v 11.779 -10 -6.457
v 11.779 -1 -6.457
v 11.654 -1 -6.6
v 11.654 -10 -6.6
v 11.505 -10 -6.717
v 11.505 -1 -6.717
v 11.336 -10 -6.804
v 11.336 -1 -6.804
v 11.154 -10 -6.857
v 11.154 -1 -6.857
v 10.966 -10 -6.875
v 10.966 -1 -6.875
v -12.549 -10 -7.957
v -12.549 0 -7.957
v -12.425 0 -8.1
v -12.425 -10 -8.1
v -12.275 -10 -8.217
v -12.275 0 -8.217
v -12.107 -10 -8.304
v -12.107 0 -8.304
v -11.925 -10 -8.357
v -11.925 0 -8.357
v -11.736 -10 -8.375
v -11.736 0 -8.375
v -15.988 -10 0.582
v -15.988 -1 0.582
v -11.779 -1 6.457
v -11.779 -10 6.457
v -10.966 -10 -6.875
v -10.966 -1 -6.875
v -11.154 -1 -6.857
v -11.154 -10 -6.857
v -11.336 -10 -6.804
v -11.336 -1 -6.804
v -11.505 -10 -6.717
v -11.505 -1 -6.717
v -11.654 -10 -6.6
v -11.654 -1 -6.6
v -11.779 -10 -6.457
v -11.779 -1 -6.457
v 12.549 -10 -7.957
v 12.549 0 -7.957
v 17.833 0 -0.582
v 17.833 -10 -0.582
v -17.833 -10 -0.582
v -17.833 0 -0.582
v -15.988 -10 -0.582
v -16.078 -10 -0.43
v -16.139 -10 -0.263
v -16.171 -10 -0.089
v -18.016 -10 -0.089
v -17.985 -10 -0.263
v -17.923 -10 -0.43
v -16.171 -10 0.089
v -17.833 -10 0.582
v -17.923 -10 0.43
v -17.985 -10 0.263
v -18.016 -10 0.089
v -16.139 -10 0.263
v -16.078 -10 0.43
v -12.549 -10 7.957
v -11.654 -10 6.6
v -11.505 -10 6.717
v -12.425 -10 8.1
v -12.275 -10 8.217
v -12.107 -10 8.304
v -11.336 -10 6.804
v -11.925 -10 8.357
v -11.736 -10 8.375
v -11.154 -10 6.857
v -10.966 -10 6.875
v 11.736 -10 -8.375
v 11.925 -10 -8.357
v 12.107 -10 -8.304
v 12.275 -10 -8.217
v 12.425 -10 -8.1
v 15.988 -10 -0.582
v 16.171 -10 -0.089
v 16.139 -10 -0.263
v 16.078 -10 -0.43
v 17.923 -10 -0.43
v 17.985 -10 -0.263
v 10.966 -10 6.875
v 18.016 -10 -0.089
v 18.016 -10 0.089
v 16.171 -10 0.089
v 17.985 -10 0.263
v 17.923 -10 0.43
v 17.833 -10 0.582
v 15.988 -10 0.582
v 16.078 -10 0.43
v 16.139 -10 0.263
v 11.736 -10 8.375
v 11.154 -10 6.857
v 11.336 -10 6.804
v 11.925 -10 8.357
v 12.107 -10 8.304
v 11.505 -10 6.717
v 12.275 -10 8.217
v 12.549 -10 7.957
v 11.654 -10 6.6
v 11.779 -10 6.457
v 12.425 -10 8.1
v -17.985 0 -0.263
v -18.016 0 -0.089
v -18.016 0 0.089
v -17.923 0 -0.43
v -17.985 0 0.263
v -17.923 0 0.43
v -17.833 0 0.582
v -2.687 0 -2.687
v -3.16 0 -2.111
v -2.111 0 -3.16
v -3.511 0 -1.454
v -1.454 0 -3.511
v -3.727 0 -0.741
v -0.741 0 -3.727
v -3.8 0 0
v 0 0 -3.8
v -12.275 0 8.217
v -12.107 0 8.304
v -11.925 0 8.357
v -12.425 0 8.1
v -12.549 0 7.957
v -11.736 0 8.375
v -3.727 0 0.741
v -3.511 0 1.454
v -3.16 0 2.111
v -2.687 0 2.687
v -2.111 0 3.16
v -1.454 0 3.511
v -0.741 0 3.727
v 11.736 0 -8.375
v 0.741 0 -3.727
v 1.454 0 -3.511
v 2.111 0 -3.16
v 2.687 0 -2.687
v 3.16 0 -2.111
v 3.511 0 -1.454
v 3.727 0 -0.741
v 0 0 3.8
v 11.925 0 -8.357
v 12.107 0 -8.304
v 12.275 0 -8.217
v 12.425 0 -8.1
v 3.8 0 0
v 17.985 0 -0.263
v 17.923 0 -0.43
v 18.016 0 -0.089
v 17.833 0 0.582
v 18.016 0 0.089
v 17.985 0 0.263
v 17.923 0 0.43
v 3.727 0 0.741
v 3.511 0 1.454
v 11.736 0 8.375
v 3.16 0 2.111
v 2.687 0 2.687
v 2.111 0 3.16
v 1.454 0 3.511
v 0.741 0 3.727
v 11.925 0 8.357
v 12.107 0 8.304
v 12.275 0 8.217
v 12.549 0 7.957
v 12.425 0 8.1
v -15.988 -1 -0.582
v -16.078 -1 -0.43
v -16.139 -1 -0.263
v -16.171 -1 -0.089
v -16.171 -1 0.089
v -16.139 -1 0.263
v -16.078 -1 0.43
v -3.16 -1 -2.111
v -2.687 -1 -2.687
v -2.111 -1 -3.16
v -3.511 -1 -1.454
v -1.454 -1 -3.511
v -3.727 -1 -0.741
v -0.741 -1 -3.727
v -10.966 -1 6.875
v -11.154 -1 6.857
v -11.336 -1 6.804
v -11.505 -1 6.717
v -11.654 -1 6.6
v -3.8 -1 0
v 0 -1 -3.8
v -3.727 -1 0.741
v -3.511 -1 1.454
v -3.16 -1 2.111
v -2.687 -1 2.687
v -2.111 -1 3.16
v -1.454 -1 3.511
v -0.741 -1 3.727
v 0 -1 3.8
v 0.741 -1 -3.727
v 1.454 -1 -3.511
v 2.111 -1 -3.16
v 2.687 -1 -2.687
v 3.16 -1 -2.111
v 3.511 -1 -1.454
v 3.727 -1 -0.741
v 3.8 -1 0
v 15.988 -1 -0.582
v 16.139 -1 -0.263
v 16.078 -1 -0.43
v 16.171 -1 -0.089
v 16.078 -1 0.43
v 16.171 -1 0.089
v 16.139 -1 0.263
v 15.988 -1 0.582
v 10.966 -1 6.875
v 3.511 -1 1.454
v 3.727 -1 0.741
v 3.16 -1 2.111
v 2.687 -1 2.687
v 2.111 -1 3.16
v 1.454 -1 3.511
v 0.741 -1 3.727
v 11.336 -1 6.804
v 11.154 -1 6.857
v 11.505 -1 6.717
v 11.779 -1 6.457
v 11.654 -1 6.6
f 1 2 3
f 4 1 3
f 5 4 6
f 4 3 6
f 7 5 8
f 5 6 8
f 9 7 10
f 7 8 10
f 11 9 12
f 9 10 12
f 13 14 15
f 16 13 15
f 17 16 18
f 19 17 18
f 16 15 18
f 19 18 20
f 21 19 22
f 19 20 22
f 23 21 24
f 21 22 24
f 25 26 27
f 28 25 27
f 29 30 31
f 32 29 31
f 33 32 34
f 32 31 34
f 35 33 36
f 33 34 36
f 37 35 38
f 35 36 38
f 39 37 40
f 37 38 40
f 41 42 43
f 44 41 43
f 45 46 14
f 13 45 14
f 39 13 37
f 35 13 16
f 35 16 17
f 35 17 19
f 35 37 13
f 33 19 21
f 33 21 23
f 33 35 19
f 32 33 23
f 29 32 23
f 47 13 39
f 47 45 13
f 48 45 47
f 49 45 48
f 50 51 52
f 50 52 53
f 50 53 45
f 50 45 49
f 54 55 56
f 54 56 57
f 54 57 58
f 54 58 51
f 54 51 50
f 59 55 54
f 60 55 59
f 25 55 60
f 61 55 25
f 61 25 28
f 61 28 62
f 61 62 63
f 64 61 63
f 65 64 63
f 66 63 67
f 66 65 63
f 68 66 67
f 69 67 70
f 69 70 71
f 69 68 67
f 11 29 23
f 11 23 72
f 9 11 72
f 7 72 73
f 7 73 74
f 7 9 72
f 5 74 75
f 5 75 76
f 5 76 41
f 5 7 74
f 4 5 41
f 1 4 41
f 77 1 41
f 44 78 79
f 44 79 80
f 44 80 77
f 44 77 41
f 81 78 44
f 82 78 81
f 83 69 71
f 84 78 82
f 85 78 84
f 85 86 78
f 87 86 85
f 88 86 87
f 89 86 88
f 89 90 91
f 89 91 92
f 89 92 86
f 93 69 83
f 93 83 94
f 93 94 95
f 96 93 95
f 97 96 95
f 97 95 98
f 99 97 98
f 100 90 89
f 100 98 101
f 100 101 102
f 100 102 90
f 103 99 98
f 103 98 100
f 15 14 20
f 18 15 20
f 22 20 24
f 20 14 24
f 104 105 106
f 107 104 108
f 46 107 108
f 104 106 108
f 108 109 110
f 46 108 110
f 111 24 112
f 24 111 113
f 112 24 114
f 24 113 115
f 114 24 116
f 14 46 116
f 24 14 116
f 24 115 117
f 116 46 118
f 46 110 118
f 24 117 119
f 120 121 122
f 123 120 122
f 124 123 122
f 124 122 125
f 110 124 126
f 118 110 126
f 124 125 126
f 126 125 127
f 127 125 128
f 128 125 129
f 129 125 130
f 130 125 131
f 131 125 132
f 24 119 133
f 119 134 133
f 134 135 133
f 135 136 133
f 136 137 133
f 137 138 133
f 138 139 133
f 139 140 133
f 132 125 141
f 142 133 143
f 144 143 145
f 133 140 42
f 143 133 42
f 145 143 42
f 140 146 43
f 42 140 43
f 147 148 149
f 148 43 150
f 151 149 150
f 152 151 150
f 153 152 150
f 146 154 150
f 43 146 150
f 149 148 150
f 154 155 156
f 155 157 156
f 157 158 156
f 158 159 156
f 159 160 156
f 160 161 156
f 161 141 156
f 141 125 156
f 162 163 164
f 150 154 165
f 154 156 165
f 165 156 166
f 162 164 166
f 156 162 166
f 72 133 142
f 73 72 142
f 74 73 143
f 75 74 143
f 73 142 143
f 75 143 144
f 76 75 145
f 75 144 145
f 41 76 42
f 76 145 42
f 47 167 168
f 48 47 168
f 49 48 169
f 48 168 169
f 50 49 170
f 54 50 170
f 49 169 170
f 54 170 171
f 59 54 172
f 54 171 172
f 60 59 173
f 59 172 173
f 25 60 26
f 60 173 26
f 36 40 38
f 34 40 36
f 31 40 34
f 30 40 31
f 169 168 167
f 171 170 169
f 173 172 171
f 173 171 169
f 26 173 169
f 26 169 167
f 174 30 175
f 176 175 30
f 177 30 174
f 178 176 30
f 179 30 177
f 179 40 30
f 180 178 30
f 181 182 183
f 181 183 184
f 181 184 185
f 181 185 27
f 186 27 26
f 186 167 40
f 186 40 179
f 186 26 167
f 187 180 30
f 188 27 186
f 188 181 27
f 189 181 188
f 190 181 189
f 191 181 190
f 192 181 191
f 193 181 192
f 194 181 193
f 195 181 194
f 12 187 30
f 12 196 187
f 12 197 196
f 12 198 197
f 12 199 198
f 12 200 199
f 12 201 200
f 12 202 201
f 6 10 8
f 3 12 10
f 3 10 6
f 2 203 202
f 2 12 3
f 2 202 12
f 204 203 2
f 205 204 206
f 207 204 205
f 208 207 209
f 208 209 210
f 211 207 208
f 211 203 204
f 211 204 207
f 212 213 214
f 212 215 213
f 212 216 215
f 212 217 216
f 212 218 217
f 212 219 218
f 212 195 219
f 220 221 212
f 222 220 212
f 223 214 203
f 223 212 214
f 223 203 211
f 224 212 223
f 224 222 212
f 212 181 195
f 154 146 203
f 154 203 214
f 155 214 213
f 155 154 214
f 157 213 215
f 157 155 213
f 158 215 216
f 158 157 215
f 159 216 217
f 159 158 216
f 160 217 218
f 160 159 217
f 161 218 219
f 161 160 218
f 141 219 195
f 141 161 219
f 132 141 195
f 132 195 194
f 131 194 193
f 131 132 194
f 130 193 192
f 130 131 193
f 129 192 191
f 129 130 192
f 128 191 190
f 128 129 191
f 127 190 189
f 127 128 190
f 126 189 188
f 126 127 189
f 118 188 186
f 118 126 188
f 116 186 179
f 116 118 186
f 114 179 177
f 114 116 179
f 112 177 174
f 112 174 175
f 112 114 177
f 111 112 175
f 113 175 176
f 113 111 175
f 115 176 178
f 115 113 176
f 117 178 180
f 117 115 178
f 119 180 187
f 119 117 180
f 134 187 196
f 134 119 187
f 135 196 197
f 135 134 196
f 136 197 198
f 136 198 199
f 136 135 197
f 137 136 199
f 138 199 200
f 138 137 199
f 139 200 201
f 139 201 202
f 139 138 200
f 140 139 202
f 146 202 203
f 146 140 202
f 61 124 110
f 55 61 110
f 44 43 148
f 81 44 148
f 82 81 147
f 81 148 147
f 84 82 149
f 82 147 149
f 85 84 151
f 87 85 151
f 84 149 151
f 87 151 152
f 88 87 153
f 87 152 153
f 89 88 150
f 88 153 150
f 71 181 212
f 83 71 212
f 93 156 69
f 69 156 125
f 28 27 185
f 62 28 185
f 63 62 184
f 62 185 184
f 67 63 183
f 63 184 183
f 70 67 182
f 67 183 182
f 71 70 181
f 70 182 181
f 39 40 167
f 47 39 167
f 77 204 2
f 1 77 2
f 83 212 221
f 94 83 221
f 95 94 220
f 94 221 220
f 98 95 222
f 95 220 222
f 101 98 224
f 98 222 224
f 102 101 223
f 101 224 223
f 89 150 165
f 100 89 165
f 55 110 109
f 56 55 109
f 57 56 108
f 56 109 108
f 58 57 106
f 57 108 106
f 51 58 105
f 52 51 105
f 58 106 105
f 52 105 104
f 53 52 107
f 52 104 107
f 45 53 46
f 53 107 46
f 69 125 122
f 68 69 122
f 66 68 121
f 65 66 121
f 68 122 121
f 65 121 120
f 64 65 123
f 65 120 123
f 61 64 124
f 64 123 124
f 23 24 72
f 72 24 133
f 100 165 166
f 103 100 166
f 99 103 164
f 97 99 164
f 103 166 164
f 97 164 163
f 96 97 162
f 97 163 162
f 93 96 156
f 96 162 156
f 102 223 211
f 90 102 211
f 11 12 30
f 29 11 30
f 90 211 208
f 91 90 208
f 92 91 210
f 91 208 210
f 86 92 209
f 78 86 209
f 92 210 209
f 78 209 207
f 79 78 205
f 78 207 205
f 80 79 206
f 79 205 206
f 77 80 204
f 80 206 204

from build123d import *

# Parameters (mm, degrees)
F0_R     = 3.8
F1_DEPTH = 1
F2_DEPTH = 10


with BuildPart() as f1:
    # F0 (on Front) → F1 (new body)
    with BuildSketch(Plane.XZ):
        with BuildLine():
            Line((-11.778597, 6.457385), (-15.987552, 0.582385))
            ThreePointArc((-15.987552, 0.582385), (-16.17464, 0), (-15.987552, -0.582385))
            Line((-15.987552, -0.582385), (-11.778597, -6.457385))
            ThreePointArc((-11.778597, -6.457385), (-11.422639, -6.76449), (-10.965684, -6.875))
            Line((-10.965684, -6.875), (10.965684, -6.875))
            ThreePointArc((10.965684, -6.875), (11.422639, -6.76449), (11.778597, -6.457385))
            Line((11.778597, -6.457385), (15.987552, -0.582385))
            ThreePointArc((15.987552, -0.582385), (16.17464, 0), (15.987552, 0.582385))
            Line((15.987552, 0.582385), (11.778597, 6.457385))
            ThreePointArc((11.778597, 6.457385), (11.422639, 6.76449), (10.965684, 6.875))
            Line((10.965684, 6.875), (-10.965684, 6.875))
            ThreePointArc((-10.965684, 6.875), (-11.422639, 6.76449), (-11.778597, 6.457385))
        make_face()
        Circle(F0_R, mode=Mode.SUBTRACT)
    extrude(amount=F1_DEPTH)

    # F0 (on Front) → F2 (join)
    with BuildSketch(Plane.XZ):
        with BuildLine():
            Line((11.736274, 8.375), (-11.736274, 8.375))
            ThreePointArc((-11.736274, 8.375), (-12.193228, 8.26449), (-12.549187, 7.957385))
            Line((-12.549187, 7.957385), (-17.832769, 0.582385))
            ThreePointArc((-17.832769, 0.582385), (-18.019856, 0), (-17.832769, -0.582385))
            Line((-17.832769, -0.582385), (-12.549187, -7.957385))
            ThreePointArc((-12.549187, -7.957385), (-12.193228, -8.26449), (-11.736274, -8.375))
            Line((-11.736274, -8.375), (11.736274, -8.375))
            ThreePointArc((11.736274, -8.375), (12.193228, -8.26449), (12.549187, -7.957385))
            Line((12.549187, -7.957385), (17.832769, -0.582385))
            ThreePointArc((17.832769, -0.582385), (18.019856, 0), (17.832769, 0.582385))
            Line((17.832769, 0.582385), (12.549187, 7.957385))
            ThreePointArc((12.549187, 7.957385), (12.193228, 8.26449), (11.736274, 8.375))
        make_face()
        with BuildLine():
            ThreePointArc((-15.987552, -0.582385), (-16.17464, 0), (-15.987552, 0.582385))
            Line((-15.987552, 0.582385), (-11.778597, 6.457385))
            ThreePointArc((-11.778597, 6.457385), (-11.422639, 6.76449), (-10.965684, 6.875))
            Line((-10.965684, 6.875), (10.965684, 6.875))
            ThreePointArc((10.965684, 6.875), (11.422639, 6.76449), (11.778597, 6.457385))
            Line((11.778597, 6.457385), (15.987552, 0.582385))
            ThreePointArc((15.987552, 0.582385), (16.17464, 0), (15.987552, -0.582385))
            Line((15.987552, -0.582385), (11.778597, -6.457385))
            ThreePointArc((11.778597, -6.457385), (11.422639, -6.76449), (10.965684, -6.875))
            Line((10.965684, -6.875), (-10.965684, -6.875))
            ThreePointArc((-10.965684, -6.875), (-11.422639, -6.76449), (-11.778597, -6.457385))
            Line((-11.778597, -6.457385), (-15.987552, -0.582385))
        make_face(mode=Mode.SUBTRACT)
    extrude(amount=F2_DEPTH)


solid = f1.part
